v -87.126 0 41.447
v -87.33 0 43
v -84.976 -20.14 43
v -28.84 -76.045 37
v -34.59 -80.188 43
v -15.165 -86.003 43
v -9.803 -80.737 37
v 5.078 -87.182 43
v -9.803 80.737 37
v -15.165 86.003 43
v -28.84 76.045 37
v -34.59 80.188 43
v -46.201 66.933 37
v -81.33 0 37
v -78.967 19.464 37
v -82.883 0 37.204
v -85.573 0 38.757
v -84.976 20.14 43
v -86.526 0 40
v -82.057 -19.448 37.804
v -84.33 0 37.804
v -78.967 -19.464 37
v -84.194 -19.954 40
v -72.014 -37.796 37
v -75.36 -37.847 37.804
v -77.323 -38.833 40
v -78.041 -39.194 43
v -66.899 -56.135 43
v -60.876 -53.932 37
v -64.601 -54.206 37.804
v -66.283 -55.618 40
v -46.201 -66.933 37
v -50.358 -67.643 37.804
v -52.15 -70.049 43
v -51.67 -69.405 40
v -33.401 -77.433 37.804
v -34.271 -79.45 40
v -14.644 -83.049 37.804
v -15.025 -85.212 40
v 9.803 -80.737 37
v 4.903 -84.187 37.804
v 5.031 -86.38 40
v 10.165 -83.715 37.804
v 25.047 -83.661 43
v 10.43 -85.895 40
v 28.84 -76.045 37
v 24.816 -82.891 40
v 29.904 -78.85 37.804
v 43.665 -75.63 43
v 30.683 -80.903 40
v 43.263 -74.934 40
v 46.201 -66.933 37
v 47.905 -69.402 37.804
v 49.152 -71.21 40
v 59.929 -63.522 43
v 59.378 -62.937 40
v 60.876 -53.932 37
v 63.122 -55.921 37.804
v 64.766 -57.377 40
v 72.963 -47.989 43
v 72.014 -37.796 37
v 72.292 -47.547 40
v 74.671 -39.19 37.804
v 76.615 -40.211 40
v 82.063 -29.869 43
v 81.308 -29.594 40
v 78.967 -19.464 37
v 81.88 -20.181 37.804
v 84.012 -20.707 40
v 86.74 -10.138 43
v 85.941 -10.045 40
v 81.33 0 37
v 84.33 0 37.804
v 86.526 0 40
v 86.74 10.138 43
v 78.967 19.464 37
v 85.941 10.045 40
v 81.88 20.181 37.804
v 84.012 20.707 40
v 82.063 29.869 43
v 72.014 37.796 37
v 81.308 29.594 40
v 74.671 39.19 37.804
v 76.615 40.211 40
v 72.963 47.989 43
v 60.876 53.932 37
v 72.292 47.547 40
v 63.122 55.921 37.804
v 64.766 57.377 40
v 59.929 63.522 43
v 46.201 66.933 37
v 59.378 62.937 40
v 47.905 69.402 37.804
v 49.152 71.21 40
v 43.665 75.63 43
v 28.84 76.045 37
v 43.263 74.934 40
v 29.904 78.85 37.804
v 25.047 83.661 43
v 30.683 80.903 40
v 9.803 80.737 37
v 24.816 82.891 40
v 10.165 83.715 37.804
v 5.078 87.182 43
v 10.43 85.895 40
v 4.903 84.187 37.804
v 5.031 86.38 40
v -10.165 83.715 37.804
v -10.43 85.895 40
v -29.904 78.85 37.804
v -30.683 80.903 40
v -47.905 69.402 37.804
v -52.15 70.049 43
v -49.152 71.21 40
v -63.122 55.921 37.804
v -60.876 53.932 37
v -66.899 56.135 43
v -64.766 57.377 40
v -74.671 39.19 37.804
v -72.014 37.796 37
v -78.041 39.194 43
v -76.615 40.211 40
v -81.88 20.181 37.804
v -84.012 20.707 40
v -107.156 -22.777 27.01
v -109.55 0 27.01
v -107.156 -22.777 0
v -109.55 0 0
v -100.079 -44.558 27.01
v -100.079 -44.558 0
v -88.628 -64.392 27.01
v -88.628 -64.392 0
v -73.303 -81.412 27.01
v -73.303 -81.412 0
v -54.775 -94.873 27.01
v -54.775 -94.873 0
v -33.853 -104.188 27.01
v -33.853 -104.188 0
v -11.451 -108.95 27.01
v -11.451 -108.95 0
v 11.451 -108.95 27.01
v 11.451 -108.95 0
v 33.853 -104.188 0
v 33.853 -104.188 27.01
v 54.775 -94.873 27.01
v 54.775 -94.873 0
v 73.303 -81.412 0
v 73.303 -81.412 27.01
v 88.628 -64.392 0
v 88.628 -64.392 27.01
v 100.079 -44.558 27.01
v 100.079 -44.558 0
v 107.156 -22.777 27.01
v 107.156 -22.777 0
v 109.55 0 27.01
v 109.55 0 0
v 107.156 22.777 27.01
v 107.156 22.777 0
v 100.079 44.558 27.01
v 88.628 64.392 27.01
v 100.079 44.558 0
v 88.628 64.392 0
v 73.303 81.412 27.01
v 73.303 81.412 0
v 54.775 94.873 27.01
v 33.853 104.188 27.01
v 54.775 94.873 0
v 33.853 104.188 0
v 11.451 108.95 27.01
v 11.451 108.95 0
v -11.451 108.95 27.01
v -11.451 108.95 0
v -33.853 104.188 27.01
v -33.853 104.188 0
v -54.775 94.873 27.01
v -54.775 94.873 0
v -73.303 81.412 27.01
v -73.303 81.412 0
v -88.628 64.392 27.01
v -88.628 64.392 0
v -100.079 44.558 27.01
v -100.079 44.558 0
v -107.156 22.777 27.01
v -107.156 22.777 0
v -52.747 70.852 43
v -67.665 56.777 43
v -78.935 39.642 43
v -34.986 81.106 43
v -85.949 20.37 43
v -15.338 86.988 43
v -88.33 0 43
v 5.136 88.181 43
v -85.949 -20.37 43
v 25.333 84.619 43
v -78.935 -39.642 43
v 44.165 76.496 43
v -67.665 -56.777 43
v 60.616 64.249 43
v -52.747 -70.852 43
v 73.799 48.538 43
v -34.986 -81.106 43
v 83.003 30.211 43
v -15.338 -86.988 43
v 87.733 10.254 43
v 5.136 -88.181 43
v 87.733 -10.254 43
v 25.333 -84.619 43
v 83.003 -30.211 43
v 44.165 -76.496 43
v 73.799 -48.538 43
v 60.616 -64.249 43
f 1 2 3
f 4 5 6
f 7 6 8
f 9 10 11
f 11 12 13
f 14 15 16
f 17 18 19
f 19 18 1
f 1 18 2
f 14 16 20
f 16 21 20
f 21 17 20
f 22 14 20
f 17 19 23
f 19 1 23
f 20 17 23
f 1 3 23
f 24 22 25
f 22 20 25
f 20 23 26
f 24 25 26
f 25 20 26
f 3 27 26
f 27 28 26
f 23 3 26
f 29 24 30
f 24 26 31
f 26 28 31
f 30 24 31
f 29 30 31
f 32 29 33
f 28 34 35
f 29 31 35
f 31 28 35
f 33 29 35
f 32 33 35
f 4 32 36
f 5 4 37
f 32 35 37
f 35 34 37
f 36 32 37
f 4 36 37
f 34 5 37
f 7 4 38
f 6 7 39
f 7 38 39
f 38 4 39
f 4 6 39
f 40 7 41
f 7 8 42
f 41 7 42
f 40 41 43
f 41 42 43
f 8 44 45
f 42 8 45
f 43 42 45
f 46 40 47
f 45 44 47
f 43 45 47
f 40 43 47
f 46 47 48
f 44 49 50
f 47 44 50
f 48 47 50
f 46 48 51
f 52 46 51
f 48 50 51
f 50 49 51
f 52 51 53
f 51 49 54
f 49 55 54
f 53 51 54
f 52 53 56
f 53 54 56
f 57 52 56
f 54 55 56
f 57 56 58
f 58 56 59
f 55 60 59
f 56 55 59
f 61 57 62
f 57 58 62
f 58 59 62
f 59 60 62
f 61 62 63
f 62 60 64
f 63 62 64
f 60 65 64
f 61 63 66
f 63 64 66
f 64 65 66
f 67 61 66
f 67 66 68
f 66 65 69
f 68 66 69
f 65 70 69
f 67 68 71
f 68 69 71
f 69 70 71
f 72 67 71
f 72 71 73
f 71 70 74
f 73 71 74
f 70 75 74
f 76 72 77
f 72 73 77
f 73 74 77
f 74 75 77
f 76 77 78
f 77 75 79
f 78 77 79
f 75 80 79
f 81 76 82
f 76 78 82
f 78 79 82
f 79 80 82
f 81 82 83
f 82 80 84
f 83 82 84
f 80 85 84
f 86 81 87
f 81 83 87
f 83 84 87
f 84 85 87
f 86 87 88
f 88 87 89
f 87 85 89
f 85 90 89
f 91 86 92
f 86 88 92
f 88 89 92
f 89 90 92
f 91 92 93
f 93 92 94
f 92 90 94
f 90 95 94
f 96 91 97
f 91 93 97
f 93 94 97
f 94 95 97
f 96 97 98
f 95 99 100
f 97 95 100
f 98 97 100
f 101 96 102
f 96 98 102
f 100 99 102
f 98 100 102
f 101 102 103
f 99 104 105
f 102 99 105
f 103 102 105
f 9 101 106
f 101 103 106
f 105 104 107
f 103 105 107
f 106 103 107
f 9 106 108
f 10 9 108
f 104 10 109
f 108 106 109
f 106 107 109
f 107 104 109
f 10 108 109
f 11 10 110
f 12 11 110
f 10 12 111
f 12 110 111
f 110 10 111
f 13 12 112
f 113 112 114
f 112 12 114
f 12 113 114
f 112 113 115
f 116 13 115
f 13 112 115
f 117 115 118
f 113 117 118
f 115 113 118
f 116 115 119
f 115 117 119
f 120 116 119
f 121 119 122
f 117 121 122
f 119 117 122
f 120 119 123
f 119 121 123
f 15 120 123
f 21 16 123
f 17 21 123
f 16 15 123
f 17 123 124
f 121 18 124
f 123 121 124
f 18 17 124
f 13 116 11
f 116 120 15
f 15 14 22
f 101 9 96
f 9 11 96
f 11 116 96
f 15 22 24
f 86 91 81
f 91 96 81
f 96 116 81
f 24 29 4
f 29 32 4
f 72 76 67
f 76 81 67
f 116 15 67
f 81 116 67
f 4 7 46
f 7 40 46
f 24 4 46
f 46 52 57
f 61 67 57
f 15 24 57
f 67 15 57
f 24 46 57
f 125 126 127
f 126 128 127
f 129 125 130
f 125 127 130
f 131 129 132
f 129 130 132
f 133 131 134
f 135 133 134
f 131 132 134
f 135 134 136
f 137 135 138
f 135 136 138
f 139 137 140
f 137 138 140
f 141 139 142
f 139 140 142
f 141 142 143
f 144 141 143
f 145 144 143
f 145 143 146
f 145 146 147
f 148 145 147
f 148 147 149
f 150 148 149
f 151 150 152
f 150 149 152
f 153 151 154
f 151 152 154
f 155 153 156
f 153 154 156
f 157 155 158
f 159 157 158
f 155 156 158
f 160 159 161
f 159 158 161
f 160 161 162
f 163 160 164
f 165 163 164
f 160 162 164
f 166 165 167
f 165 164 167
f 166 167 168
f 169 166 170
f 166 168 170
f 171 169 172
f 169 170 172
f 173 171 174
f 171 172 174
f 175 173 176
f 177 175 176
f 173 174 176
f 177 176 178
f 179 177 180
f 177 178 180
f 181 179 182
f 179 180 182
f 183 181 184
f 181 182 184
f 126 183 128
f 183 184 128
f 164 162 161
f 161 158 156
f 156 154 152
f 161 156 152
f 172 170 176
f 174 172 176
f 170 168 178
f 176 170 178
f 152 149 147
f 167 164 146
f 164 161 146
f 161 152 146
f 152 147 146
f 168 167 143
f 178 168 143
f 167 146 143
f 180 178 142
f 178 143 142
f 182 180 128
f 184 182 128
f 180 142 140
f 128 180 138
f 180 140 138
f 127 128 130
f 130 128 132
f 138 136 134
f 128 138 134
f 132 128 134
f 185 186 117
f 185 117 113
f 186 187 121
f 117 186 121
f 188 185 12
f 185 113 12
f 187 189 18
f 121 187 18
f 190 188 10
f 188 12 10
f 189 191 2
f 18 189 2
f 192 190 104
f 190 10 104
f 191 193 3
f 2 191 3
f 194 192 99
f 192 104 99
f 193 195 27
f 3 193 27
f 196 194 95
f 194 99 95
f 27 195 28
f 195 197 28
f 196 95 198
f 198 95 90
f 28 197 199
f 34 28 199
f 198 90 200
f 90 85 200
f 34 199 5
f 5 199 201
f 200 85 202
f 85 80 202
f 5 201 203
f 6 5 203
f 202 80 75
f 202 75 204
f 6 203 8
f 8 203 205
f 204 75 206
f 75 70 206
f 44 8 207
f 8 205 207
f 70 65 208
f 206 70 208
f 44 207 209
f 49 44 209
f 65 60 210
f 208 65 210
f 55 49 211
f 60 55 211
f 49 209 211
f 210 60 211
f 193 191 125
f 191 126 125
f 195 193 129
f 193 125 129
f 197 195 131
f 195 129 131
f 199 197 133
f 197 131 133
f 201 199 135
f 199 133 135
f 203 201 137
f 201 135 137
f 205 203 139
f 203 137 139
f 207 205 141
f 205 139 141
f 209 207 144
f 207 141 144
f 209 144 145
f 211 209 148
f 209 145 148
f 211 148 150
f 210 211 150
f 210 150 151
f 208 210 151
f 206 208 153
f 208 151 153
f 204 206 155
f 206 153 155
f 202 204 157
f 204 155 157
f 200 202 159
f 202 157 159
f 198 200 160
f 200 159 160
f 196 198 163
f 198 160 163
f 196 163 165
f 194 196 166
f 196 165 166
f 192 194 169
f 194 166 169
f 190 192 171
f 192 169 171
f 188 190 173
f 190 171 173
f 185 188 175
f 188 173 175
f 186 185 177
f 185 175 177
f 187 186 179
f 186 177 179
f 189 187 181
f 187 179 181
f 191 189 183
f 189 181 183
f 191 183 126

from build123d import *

# Parameters (mm, degrees)
F2_R = 5.99999


# Not quite as in the source:
# - a fillet or chamfer is up to 0.001 mm smaller than in the source, because OpenCascade refuses the exact size


with BuildPart() as f1:
    # F0 (on Front) → F1 (revolve)
    with BuildSketch(Plane.XZ):
        Polygon((-109.55, 0), (0, 0), (0, 37), (-87.33, 37), (-87.33, 43), (-88.33, 43), (-109.55, 27.0095830568), align=None)
    revolve(axis=Axis((0, 0, 18.5), (0, 0, 1)))

    # F2 (radius 6 in the source; OpenCascade refuses exactly that, so slightly less here)
    f2_edges = [f1.edges().sort_by_distance(p)[0] for p in [
        (87.33, 0, 37),
    ]]
    fillet(f2_edges, radius=F2_R)


solid = f1.part
